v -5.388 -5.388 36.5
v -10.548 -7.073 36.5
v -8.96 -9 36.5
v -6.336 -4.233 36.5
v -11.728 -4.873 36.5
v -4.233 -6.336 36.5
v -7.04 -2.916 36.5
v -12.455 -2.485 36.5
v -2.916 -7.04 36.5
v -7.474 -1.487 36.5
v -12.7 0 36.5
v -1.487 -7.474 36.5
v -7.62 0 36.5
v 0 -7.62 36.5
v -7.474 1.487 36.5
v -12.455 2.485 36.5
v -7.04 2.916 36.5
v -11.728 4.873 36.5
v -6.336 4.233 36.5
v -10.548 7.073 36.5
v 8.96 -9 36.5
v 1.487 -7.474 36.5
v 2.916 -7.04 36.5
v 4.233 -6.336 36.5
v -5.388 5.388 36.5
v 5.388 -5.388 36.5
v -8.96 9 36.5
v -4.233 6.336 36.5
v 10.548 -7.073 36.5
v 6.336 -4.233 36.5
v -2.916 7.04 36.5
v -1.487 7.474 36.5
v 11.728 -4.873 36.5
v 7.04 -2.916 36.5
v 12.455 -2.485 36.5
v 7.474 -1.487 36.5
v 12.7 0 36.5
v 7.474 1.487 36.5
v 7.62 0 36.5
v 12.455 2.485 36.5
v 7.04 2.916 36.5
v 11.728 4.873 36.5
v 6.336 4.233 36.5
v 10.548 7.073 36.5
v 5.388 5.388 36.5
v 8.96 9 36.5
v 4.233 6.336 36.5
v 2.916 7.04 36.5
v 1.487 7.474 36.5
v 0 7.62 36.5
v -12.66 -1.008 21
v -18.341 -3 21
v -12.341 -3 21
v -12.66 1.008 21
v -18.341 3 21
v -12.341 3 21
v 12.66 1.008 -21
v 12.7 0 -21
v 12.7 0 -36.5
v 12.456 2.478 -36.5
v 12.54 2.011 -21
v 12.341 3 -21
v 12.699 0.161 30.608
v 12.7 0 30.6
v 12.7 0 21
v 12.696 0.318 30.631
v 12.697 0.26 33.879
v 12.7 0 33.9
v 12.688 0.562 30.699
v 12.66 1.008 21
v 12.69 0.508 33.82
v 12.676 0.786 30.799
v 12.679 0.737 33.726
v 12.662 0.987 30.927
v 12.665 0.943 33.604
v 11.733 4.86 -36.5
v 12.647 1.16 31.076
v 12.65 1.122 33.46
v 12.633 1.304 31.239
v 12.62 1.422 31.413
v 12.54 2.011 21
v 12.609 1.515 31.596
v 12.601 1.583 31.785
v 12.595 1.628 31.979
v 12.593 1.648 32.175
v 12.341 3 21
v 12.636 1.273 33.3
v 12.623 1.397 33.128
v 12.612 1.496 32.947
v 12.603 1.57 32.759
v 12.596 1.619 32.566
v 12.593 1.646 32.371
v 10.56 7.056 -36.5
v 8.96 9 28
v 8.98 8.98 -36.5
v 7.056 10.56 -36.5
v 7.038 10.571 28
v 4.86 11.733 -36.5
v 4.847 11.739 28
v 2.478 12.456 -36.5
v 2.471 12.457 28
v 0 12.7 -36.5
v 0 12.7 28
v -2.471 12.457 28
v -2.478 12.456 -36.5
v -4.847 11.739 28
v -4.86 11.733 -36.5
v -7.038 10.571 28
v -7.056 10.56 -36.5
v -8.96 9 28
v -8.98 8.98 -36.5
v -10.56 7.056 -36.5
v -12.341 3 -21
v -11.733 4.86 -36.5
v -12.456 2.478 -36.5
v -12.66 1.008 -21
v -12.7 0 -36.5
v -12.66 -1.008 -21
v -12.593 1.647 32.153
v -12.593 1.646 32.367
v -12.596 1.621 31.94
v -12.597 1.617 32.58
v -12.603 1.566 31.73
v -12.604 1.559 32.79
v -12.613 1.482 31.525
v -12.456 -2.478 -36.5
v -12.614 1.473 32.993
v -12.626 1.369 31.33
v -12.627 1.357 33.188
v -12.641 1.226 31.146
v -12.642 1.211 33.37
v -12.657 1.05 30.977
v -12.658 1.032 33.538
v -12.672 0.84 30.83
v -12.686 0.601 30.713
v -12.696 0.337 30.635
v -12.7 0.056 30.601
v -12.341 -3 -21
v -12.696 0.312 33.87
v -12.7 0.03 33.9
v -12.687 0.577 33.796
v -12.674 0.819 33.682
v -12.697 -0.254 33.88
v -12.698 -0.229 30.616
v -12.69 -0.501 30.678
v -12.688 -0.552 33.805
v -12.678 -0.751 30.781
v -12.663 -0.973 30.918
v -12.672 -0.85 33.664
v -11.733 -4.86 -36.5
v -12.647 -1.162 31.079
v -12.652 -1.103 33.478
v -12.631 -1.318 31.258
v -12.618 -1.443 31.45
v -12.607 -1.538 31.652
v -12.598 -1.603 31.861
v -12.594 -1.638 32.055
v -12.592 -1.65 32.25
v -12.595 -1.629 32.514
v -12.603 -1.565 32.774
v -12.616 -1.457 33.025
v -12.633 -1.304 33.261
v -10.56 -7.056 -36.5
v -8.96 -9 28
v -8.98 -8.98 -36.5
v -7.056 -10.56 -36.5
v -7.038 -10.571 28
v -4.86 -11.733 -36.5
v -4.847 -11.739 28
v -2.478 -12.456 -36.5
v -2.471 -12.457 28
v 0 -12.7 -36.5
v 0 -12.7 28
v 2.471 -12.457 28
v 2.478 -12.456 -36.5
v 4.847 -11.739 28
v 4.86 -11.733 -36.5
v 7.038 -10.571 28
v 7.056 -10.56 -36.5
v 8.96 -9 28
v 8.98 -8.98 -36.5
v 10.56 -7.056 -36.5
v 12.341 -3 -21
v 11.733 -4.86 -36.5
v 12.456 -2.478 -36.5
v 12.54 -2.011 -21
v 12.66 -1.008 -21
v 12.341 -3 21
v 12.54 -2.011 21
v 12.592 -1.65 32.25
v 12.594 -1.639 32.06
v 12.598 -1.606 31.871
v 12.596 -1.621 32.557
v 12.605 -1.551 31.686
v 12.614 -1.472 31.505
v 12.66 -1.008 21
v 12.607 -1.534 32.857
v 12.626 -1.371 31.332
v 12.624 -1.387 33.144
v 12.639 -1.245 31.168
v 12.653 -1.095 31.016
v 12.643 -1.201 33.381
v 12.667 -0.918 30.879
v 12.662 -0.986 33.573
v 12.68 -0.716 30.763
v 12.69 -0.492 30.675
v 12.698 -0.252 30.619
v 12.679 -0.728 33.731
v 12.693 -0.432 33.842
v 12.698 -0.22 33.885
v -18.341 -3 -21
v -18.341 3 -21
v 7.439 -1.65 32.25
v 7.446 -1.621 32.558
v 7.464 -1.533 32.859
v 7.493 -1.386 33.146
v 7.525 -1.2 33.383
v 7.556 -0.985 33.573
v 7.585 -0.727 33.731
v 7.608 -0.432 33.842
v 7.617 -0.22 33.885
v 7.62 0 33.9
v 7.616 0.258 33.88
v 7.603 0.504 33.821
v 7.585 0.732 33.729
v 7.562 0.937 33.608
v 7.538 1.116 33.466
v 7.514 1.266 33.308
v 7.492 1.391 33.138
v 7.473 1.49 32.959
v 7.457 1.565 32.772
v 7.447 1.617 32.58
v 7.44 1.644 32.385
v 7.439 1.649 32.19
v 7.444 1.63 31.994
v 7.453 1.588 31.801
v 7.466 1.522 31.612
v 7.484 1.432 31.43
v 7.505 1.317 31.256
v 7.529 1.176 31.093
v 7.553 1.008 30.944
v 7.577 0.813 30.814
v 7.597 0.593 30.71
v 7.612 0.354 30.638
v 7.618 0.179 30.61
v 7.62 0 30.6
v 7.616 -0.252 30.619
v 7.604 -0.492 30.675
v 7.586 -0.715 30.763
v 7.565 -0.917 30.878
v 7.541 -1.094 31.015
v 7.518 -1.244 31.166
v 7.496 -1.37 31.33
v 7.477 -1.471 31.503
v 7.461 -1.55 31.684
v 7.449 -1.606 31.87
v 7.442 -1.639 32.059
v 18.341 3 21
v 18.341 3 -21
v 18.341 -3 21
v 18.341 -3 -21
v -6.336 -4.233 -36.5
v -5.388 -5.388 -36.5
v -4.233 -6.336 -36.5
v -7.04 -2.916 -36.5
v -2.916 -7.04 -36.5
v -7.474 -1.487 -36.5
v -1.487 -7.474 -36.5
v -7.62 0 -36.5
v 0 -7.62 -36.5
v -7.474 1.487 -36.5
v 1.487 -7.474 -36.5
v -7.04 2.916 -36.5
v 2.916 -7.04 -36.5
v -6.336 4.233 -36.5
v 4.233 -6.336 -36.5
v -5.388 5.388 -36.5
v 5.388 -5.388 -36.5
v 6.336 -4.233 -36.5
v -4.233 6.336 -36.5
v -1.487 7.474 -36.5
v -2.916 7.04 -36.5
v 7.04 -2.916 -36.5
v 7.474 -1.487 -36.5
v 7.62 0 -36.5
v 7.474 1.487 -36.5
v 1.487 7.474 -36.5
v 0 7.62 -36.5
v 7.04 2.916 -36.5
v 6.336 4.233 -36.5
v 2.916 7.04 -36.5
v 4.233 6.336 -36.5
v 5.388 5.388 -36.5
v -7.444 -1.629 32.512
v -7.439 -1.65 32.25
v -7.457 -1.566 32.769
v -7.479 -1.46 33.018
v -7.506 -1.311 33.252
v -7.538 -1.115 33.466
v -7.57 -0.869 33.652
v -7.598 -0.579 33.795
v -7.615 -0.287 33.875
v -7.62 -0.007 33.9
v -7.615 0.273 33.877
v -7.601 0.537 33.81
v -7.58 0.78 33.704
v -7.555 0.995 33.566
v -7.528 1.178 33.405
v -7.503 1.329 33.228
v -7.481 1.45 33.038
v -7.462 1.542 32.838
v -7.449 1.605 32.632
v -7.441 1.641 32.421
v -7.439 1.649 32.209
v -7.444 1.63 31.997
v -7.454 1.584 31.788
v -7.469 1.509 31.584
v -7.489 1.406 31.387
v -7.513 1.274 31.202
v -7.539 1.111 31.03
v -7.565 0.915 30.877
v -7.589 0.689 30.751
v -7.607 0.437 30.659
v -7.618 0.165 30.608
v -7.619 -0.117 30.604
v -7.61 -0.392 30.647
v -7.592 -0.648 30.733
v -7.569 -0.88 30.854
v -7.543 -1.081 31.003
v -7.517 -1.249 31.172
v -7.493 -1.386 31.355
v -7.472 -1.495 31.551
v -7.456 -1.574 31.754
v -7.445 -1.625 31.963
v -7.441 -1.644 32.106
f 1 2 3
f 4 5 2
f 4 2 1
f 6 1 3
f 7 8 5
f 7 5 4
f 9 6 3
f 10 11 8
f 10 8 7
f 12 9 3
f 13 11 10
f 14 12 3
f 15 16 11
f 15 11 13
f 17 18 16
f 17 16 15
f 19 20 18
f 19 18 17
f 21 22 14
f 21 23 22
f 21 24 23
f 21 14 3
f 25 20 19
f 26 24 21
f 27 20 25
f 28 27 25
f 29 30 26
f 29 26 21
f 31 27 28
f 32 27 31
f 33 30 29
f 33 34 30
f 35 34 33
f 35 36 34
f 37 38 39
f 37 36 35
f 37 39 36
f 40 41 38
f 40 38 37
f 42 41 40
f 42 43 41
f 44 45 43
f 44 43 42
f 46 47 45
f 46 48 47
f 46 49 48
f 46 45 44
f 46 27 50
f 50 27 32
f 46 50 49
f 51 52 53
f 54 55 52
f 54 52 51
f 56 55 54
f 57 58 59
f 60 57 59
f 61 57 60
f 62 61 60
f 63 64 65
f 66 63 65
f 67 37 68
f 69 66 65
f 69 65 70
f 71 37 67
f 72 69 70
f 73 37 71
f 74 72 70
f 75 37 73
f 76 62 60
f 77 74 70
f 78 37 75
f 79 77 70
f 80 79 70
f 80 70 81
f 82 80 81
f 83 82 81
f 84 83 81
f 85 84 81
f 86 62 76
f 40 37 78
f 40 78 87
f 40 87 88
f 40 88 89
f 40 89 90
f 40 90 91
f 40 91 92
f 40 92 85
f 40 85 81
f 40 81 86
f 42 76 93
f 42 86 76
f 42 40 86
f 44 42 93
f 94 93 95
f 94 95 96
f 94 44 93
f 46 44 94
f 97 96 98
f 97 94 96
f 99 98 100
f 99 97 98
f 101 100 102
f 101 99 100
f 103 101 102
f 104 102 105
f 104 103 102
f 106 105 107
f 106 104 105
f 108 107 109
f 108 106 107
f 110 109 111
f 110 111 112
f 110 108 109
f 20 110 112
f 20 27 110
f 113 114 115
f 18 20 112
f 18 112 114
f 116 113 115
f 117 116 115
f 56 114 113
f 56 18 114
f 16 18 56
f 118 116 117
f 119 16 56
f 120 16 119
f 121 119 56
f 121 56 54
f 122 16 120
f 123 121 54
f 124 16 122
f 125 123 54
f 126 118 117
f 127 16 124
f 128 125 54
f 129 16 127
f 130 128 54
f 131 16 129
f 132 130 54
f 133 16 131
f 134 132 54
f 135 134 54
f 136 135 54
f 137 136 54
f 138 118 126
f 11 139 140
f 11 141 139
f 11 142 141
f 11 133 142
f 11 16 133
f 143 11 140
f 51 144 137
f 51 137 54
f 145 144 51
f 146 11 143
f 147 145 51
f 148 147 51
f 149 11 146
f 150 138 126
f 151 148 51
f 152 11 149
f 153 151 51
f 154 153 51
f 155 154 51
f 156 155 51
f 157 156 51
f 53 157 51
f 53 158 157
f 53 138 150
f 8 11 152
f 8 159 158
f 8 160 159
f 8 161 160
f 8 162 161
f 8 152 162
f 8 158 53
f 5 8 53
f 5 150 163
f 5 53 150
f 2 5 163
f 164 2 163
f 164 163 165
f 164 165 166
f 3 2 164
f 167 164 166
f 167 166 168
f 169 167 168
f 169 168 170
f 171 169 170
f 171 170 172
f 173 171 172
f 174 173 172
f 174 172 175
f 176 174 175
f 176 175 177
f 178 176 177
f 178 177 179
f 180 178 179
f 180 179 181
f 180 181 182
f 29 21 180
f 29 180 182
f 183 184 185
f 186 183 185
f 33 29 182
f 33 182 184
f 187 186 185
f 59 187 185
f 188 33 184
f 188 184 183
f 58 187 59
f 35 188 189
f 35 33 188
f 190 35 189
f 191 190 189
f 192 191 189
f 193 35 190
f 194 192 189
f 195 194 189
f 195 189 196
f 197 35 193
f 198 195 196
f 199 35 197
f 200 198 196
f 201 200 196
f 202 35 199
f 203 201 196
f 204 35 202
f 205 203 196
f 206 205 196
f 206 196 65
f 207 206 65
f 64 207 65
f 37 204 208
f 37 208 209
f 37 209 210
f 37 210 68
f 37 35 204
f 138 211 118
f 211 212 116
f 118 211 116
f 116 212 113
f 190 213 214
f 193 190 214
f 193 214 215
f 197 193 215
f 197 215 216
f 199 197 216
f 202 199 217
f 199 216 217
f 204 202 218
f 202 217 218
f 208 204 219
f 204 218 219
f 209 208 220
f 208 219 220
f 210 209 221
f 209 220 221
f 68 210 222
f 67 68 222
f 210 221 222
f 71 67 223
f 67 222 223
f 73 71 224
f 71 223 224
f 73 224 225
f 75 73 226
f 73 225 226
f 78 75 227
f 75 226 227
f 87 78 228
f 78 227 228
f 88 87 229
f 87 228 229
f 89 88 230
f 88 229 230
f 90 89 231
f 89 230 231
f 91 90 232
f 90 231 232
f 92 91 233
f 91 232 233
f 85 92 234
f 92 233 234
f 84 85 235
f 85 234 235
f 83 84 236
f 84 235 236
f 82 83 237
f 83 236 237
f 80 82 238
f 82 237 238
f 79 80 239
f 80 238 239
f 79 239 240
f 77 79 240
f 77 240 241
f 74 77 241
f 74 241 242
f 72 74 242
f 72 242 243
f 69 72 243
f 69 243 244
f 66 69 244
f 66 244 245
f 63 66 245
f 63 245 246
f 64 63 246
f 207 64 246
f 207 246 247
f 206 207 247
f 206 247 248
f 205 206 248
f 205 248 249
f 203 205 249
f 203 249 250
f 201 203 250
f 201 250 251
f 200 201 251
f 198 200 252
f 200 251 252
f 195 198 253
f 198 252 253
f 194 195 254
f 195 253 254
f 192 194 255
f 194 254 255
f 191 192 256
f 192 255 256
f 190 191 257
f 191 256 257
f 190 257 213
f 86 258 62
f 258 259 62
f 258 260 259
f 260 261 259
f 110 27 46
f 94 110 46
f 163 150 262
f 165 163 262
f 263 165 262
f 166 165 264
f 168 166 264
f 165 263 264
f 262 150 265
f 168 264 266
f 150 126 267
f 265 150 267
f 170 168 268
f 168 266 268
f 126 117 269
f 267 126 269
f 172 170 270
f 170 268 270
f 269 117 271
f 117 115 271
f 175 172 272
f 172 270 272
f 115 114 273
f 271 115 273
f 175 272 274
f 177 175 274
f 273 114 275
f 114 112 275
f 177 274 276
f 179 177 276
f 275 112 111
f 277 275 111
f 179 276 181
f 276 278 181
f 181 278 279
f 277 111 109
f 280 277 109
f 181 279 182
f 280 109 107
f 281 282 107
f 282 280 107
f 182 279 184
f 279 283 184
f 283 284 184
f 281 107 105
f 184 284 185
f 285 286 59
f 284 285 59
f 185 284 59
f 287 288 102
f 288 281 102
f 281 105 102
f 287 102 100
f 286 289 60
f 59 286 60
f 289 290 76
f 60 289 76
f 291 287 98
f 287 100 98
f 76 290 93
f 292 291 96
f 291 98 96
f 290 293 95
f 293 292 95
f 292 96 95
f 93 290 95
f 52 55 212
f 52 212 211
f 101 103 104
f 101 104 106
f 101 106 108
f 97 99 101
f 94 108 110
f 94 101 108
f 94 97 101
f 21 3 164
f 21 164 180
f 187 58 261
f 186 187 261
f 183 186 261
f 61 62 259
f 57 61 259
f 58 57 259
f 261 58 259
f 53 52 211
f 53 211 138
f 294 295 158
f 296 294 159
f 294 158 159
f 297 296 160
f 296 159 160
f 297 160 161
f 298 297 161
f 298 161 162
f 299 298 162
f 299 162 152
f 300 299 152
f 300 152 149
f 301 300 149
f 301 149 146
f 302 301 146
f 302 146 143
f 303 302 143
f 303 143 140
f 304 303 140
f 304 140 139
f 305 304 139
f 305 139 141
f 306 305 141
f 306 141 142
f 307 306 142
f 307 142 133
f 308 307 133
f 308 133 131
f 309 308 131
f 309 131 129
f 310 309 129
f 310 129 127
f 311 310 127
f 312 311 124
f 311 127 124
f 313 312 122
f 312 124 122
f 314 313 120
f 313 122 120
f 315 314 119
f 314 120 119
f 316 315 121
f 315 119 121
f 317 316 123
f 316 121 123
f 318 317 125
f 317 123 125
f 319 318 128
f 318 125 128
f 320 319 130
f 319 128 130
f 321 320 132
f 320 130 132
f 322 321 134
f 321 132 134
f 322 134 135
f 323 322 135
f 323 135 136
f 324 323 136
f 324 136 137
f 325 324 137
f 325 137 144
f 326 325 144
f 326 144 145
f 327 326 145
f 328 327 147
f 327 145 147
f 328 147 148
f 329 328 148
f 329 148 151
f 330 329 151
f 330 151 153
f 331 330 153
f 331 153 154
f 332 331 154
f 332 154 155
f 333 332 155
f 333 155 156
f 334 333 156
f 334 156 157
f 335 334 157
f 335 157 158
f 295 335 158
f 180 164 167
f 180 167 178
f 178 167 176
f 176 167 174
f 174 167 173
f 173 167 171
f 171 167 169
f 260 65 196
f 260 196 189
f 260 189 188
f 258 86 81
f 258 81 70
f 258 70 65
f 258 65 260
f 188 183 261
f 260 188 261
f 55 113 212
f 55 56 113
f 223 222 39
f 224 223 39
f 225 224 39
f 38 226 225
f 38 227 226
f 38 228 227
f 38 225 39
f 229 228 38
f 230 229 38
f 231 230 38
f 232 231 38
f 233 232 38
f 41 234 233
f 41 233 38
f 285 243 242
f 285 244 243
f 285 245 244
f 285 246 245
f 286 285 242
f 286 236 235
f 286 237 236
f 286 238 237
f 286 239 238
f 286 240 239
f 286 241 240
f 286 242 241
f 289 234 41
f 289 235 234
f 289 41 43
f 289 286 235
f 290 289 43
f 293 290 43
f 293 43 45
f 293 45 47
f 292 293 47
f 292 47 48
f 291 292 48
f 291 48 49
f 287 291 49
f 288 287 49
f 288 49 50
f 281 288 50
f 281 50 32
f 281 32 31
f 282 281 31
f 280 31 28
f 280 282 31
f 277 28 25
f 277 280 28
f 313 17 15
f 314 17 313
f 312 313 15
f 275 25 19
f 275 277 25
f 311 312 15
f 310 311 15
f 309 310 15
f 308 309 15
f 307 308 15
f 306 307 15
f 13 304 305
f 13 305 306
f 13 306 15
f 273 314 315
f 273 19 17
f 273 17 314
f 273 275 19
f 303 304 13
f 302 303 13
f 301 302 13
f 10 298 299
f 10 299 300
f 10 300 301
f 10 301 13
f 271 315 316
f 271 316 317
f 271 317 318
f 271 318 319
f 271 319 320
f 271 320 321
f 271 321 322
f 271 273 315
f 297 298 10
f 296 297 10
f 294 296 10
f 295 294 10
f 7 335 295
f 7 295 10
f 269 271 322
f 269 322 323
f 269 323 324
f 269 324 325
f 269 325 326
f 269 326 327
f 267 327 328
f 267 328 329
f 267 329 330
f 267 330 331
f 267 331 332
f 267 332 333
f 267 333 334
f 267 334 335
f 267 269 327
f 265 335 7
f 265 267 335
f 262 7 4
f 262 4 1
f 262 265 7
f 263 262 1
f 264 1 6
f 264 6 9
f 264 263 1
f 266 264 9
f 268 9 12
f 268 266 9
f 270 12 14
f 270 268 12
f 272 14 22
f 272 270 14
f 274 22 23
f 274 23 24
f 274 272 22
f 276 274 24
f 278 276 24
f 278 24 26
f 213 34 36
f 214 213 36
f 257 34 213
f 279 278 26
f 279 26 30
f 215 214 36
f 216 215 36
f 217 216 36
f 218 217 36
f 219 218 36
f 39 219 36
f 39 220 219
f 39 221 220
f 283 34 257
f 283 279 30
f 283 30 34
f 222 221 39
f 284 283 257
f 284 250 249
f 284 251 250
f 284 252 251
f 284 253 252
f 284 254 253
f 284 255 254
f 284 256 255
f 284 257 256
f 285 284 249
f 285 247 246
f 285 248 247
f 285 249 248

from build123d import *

# Parameters (mm, degrees)
F0_R     = 12.7
F0_R_2   = 7.62
F1_DEPTH = 36.5
F3_DEPTH = 21
F4_W     = 43.0633045018
F4_H     = 8.1969123185
F4_H_2   = 6.7737210393
F5_DEPTH = 8.5
F8_D     = 3.3
F8_DEPTH = 30
F8_TIP   = 0.9914200214


with BuildPart() as f1:
    # F0 (on Top) → F1 (new body, symmetric)
    with BuildSketch(Plane.XY):
        Circle(F0_R)
        Circle(F0_R_2, mode=Mode.SUBTRACT)
    extrude(amount=F1_DEPTH, both=True)

    # F2 (on Top) → F3 (join, symmetric)
    with BuildSketch(Plane.XY):
        with BuildLine():
            Line((12.3405834546, -3), (18.3405834546, -3))
            Line((18.3405834546, -3), (18.3405834546, 3))
            Line((18.3405834546, 3), (12.3405834546, 3))
            ThreePointArc((12.3405834546, 3), (12.7, 0), (12.3405834546, -3))
        make_face()
        with BuildLine():
            Line((-12.3405834546, 3), (-18.3405834546, 3))
            Line((-18.3405834546, 3), (-18.3405834546, -3))
            Line((-18.3405834546, -3), (-12.3405834546, -3))
            ThreePointArc((-12.3405834546, -3), (-12.7, 0), (-12.3405834546, 3))
        make_face()
    extrude(amount=F3_DEPTH, both=True)

    # F4 (on face) → F5 (cut)
    with BuildSketch(Plane.XY.offset(36.5)):
        with Locations((0, -13.0984561592)):
            Rectangle(F4_W, F4_H)
        with Locations((0, 12.3868605196)):
            Rectangle(F4_W, F4_H_2)
    extrude(amount=-F5_DEPTH, mode=Mode.SUBTRACT)

    # F8
    with Locations(Plane.YZ.offset(12.7)):
        with Locations((0, 32.25)):
            Hole(F8_D / 2, depth=F8_DEPTH)
            with Locations((0, 0, -(F8_DEPTH + F8_TIP / 2))):  # 118° drill point
                Cone(0, F8_D / 2, F8_TIP, mode=Mode.SUBTRACT)


solid = f1.part
